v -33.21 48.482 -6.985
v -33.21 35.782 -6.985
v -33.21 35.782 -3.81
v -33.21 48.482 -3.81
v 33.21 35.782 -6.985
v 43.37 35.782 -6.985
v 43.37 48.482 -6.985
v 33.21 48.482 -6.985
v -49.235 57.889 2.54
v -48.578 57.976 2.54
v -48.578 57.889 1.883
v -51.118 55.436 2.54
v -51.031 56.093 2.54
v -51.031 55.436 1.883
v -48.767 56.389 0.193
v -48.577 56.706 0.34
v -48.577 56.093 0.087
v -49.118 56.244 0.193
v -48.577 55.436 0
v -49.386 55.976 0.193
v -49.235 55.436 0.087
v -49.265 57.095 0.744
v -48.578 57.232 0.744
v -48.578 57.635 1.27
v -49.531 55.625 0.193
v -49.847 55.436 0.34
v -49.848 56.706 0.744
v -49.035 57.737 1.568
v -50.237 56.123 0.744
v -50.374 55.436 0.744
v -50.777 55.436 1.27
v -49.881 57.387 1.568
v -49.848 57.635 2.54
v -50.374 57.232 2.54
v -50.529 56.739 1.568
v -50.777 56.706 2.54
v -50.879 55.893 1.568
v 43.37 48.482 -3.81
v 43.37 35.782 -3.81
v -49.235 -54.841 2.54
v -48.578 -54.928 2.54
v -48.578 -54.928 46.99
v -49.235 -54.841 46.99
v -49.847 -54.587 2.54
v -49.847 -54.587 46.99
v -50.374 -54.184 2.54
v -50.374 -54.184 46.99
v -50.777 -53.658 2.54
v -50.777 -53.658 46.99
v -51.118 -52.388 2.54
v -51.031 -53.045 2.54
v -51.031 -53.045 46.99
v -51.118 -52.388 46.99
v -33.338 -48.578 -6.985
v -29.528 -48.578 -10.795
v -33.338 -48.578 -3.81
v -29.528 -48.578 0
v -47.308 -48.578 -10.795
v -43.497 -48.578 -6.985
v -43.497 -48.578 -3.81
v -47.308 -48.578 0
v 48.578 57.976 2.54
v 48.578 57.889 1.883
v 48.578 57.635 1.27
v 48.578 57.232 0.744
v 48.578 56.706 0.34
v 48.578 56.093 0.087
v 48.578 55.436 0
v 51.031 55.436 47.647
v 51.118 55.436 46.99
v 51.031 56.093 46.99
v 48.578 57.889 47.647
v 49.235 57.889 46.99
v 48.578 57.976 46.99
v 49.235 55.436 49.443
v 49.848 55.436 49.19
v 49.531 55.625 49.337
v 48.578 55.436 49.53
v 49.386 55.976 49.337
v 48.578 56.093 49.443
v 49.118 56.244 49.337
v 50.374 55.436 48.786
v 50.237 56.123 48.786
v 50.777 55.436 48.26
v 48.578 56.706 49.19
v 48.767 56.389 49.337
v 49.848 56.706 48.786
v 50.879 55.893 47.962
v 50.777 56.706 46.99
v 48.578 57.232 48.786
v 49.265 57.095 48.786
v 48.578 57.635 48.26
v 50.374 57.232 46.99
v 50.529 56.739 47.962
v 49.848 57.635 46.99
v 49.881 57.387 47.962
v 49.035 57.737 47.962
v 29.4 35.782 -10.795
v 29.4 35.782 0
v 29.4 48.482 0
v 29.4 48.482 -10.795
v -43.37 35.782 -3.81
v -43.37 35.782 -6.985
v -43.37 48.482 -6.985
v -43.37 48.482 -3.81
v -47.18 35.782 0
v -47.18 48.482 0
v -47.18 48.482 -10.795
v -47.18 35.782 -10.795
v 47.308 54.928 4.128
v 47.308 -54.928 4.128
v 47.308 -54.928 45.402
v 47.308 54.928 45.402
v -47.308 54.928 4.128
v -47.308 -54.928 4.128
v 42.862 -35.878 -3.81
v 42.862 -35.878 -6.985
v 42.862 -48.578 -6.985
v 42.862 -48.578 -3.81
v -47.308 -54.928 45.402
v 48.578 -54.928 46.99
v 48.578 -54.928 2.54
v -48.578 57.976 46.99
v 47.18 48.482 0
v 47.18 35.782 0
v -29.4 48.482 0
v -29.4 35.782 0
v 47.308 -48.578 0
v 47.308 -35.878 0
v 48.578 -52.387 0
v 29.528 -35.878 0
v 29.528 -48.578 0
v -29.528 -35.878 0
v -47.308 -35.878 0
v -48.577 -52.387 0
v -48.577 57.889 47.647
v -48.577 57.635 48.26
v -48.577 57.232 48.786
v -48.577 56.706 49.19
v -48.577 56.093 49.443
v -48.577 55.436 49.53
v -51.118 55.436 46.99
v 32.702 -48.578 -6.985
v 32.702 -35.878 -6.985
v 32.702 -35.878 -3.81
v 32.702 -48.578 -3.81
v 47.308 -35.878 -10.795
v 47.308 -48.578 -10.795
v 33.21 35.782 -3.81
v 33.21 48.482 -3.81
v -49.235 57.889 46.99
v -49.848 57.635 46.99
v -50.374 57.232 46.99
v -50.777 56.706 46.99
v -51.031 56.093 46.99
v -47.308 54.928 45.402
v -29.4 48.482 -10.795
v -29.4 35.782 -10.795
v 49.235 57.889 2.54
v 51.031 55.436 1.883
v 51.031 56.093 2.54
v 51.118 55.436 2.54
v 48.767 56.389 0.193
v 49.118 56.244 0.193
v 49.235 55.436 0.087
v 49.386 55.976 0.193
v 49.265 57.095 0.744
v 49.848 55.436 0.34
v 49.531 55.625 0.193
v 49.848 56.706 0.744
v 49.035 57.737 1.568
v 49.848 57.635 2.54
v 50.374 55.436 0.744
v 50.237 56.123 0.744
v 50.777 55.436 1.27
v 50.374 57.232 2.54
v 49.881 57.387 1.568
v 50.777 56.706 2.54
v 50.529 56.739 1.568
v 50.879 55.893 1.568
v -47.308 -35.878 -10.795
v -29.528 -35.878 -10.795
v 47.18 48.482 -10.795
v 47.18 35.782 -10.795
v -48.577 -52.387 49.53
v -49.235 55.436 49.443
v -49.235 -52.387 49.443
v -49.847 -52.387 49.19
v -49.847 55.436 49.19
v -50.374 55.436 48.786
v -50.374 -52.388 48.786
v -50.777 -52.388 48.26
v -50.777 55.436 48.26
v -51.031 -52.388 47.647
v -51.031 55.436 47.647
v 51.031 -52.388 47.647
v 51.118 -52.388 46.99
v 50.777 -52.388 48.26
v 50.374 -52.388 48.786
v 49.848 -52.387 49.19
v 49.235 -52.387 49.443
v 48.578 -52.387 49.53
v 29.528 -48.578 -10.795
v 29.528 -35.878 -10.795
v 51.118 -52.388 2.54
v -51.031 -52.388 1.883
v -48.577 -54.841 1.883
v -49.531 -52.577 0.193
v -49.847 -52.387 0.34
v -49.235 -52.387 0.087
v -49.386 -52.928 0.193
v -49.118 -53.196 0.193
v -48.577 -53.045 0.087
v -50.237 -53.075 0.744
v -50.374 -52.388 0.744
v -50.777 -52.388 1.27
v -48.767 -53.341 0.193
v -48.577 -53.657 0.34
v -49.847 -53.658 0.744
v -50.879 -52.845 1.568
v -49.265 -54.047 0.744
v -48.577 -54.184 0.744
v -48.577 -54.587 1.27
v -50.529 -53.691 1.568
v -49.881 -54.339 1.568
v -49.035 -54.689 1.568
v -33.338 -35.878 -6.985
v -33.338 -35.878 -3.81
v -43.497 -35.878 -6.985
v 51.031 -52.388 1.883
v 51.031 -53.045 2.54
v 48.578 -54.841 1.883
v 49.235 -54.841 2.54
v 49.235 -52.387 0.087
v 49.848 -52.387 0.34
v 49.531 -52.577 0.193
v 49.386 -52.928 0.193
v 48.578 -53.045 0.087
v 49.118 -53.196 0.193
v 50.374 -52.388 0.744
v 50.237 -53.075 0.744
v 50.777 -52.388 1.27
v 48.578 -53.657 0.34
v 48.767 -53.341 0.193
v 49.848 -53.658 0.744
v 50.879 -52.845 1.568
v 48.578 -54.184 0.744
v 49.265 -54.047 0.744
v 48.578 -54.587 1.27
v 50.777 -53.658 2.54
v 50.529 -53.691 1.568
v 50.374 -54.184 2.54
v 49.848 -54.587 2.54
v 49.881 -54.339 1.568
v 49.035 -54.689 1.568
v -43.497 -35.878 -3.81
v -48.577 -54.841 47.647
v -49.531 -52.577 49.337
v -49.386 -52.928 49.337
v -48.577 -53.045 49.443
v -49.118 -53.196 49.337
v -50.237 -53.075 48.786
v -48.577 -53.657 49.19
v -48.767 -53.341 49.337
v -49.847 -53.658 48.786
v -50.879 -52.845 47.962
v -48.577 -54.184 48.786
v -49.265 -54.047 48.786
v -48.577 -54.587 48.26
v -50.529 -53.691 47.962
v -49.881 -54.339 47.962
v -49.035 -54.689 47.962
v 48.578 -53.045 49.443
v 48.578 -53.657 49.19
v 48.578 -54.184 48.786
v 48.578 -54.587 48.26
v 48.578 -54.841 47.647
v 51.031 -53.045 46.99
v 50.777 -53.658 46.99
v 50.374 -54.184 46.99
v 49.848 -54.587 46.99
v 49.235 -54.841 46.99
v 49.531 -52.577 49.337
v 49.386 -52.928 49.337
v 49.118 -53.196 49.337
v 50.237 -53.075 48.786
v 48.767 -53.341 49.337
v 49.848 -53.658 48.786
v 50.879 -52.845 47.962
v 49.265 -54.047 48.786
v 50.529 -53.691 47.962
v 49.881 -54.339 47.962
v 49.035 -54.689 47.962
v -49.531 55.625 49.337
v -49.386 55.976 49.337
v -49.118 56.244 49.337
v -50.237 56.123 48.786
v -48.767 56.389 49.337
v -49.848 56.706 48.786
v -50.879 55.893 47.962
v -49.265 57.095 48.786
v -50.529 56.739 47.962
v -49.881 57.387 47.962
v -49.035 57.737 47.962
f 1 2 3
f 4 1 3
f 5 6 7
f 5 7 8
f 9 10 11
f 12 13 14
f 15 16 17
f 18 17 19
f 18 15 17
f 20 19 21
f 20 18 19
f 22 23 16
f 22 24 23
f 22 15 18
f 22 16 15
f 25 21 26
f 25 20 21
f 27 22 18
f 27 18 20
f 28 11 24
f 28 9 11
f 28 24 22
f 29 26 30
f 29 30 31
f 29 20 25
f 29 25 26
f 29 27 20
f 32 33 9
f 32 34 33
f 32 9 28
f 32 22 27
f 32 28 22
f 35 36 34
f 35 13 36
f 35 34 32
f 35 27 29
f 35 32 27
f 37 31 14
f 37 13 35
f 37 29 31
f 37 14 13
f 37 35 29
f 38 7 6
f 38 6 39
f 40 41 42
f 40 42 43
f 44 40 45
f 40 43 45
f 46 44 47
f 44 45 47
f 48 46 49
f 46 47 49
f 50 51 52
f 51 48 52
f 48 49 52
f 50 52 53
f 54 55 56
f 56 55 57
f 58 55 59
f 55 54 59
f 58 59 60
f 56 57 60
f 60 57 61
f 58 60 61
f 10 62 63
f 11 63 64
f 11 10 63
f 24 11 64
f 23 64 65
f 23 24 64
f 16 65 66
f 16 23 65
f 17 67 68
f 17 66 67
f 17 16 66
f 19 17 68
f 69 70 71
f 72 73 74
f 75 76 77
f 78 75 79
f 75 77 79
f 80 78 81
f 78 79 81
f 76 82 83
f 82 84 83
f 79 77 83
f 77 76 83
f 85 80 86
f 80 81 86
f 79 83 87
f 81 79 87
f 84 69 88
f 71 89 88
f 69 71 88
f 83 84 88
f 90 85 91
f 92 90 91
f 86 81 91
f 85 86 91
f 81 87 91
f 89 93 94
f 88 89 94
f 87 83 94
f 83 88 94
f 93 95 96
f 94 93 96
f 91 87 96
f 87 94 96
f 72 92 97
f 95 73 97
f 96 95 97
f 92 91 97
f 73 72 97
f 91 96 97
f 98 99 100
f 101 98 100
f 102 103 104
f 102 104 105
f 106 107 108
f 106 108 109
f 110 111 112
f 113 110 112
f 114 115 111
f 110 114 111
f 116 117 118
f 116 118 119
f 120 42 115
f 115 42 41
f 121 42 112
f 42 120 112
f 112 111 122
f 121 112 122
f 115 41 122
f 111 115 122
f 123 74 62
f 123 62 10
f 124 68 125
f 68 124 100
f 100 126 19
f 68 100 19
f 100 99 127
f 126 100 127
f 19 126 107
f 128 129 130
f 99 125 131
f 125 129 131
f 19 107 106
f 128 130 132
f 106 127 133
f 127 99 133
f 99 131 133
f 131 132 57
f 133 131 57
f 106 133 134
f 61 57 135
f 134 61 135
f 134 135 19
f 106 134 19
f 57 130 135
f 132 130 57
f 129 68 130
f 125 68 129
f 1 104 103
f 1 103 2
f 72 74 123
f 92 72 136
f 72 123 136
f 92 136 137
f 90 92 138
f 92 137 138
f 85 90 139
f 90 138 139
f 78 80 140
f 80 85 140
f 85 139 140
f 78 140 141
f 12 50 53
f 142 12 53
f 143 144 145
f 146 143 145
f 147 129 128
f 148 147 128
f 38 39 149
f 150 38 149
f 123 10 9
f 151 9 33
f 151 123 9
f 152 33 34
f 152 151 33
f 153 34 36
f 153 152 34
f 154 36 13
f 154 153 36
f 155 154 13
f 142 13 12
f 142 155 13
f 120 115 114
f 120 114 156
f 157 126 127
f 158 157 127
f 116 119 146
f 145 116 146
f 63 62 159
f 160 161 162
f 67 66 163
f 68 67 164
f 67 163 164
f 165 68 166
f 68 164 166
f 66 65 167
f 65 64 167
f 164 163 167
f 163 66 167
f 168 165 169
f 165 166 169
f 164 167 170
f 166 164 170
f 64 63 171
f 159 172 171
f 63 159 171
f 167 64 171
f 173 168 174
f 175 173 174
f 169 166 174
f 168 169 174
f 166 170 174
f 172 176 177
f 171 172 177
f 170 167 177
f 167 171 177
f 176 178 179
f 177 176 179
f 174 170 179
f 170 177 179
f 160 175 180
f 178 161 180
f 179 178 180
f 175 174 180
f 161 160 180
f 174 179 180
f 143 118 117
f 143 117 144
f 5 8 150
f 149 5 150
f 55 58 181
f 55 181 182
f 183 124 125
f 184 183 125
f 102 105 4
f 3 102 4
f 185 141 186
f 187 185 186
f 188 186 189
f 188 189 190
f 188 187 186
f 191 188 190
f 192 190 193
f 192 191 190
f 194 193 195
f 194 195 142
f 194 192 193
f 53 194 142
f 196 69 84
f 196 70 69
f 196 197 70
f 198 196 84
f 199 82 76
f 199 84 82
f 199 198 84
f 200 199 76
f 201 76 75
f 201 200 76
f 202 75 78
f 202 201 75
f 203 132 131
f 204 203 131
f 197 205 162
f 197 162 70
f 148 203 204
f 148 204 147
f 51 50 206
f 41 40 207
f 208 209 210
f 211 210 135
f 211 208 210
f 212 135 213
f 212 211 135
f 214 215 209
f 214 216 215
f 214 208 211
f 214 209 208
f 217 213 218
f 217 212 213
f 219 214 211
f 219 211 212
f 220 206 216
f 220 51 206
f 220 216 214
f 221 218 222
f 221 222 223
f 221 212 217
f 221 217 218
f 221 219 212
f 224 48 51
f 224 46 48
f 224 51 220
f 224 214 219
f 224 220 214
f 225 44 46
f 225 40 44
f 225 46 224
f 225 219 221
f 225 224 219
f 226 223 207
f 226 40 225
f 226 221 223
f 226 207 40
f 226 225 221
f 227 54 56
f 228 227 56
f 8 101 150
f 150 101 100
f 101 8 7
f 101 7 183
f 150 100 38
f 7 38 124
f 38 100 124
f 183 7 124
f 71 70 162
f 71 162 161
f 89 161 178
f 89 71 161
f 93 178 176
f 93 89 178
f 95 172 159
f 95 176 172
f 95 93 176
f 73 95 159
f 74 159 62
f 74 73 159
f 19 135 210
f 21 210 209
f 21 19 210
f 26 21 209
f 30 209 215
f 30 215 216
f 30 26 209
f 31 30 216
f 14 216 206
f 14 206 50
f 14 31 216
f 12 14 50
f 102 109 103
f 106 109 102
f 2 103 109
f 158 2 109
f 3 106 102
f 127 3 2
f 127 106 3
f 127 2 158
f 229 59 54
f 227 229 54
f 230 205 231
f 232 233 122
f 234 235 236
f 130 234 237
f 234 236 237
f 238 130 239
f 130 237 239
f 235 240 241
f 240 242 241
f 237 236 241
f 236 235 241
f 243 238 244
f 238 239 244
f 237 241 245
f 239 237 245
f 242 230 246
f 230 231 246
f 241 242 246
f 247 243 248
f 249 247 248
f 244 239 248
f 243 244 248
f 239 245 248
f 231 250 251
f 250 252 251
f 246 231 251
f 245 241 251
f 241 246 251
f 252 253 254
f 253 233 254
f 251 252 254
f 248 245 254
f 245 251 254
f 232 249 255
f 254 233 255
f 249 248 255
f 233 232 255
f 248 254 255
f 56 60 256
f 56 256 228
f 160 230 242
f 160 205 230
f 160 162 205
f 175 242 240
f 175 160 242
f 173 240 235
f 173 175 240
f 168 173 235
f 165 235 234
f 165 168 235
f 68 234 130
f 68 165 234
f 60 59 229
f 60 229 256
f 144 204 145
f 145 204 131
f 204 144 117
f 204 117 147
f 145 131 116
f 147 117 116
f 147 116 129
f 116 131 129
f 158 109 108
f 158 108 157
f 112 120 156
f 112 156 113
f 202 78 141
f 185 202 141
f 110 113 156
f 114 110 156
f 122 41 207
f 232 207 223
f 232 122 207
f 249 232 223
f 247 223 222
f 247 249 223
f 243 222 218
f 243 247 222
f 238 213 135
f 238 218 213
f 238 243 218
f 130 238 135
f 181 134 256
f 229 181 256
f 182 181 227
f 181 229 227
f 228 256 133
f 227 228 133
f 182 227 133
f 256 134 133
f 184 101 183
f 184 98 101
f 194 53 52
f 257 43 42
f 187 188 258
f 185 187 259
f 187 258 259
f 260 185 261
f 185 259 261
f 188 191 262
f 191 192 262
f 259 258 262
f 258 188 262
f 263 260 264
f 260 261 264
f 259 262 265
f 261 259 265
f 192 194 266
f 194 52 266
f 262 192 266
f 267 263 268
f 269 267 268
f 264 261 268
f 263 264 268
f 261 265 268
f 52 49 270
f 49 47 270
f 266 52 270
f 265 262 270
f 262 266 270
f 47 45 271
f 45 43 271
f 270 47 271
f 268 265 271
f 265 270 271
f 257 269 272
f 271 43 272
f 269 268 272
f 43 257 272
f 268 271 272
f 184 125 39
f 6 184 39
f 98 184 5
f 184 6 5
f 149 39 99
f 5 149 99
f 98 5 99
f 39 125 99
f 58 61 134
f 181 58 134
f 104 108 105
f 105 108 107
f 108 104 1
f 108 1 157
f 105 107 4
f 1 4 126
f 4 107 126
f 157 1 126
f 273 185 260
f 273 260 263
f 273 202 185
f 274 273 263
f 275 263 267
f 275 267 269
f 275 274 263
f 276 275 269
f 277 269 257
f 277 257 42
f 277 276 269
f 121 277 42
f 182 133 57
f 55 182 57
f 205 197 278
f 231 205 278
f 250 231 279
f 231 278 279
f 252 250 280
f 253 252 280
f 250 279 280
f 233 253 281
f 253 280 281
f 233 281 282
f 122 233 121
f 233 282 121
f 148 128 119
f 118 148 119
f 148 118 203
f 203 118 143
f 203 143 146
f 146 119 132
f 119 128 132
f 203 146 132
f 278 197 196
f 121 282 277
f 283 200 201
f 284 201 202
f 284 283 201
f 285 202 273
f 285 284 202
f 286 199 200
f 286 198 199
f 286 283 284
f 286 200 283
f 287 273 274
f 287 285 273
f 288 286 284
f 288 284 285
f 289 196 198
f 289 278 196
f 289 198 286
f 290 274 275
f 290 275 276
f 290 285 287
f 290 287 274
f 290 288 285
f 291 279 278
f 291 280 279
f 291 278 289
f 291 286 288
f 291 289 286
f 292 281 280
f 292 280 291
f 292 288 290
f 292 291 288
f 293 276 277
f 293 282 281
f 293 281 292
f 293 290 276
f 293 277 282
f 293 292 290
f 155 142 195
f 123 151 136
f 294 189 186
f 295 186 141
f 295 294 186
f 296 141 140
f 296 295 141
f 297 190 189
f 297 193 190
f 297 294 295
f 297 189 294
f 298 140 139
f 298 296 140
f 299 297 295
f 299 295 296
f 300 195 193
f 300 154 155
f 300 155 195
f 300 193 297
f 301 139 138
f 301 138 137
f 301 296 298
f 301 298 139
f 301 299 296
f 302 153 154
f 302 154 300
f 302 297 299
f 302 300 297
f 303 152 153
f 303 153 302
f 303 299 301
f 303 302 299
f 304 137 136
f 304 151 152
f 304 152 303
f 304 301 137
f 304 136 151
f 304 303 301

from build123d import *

# Parameters (mm, degrees)
F0_W      = 102.235
F0_H      = 109.855
F1_DEPTH  = 49.53
F2_W      = 94.615
F2_H      = 41.275
F3_DEPTH  = 111.252
F4_W      = 17.78
F4_H      = 12.7
F5_DEPTH  = 10.795
F6_W      = 10.16
F6_H      = 3.175
F7_DEPTH  = 12.7
F8_W      = 102.235
F8_H      = 49.53
F9_DEPTH  = 3.048
F10_W     = 10.16
F10_H     = 3.175
F11_DEPTH = 25.4
F12_W     = 10.16
F12_H     = 3.175
F13_DEPTH = 25.4
F14_R     = 2.54
F15_W     = 10.16
F15_H     = 3.175
F16_DEPTH = 25.4
F17_W     = 10.16
F17_H     = 3.175
F18_DEPTH = 25.4


with BuildPart() as f1:
    # F0 (on Top) → F1 (new body)
    with BuildSketch(Plane.XY):
        Rectangle(F0_W, F0_H)
    extrude(amount=F1_DEPTH)

    # F2 (on face) → F3 (cut)
    with BuildSketch(Plane.XZ.offset(54.9275)):
        with Locations((0, 24.765)):
            Rectangle(F2_W, F2_H)
    extrude(amount=-F3_DEPTH, mode=Mode.SUBTRACT)

    # F4 (on face) → F5 (join)
    with BuildSketch(Plane(origin=(0, 0, 0), x_dir=(1, 0, 0), z_dir=(0, 0, -1))):
        with Locations((-38.290499, -42.132252)):
            Rectangle(F4_W, F4_H)
        Polygon((-38.4175, 48.5775), (-47.3075, 48.5775), (-47.3075, 35.8775), (-29.5275, 35.8775), (-29.5275, 48.5775), align=None)
        Polygon((47.3075, 48.5775), (38.4175, 48.5775), (29.5275, 48.5775), (29.5275, 35.8775), (47.3075, 35.8775), align=None)
        Polygon((29.400499, -48.482252), (38.4175, -48.482252), (47.180499, -48.482252), (47.180499, -35.782252), (29.400499, -35.782252), align=None)
    extrude(amount=F5_DEPTH)

    # F6 (on face) → F7 (cut)
    with BuildSketch(Plane(origin=(-51.1175, 0, 0), x_dir=(0, -1, 0), z_dir=(-1, 0, 0))):
        with Locations((-26.9875, -3.175)):
            Rectangle(F6_W, F6_H)
        with Locations((26.9875, -3.175)):
            Rectangle(F6_W, F6_H)
    extrude(amount=-F7_DEPTH, mode=Mode.SUBTRACT)

    # F8 (on face) → F9 (join)
    with BuildSketch(Plane(origin=(0, 54.9275, 0), x_dir=(-1, 0, 0), z_dir=(0, 1, 0))):
        with Locations((0, 24.765)):
            Rectangle(F8_W, F8_H)
    extrude(amount=F9_DEPTH)

    # F10 (on face) → F11 (cut)
    with BuildSketch(Plane.XZ.offset(48.5775)):
        with Locations((-38.4175, -5.3975)):
            Rectangle(F10_W, F10_H)
    extrude(amount=-F11_DEPTH, mode=Mode.SUBTRACT)

    # F12 (on face) → F13 (cut)
    with BuildSketch(Plane.XZ.offset(-35.782252)):
        with Locations((-38.290499, -5.3975)):
            Rectangle(F12_W, F12_H)
    extrude(amount=-F13_DEPTH, mode=Mode.SUBTRACT)

    # F14
    f14_edges = [f1.edges().sort_by_distance(p)[0] for p in [
        (-51.1175, -54.9275, 24.765),
        (51.1175, -54.9275, 24.765),
        (51.1175, 57.9755, 24.765),
        (-51.1175, 57.9755, 24.765),
        (0, 57.9755, 0),
        (51.1175, 1.524, 0),
        (51.1175, 1.524, 49.53),
        (-51.1175, 1.524, 0),
        (-51.1175, 1.524, 49.53),
        (0, 57.9755, 49.53),
        (0, -54.9275, 49.53),
        (0, -54.9275, 0),
    ]]
    fillet(f14_edges, radius=F14_R)

    # F15 (on face) → F16 (cut)
    with BuildSketch(Plane(origin=(0, 48.482252, 0), x_dir=(-1, 0, 0), z_dir=(0, 1, 0))):
        with Locations((-38.290499, -5.3975)):
            Rectangle(F15_W, F15_H)
    extrude(amount=-F16_DEPTH, mode=Mode.SUBTRACT)

    # F17 (on face) → F18 (cut)
    with BuildSketch(Plane(origin=(0, -35.8775, 0), x_dir=(-1, 0, 0), z_dir=(0, 1, 0))):
        with Locations((-37.7825, -5.3975)):
            Rectangle(F17_W, F17_H)
    extrude(amount=-F18_DEPTH, mode=Mode.SUBTRACT)


solid = f1.part
